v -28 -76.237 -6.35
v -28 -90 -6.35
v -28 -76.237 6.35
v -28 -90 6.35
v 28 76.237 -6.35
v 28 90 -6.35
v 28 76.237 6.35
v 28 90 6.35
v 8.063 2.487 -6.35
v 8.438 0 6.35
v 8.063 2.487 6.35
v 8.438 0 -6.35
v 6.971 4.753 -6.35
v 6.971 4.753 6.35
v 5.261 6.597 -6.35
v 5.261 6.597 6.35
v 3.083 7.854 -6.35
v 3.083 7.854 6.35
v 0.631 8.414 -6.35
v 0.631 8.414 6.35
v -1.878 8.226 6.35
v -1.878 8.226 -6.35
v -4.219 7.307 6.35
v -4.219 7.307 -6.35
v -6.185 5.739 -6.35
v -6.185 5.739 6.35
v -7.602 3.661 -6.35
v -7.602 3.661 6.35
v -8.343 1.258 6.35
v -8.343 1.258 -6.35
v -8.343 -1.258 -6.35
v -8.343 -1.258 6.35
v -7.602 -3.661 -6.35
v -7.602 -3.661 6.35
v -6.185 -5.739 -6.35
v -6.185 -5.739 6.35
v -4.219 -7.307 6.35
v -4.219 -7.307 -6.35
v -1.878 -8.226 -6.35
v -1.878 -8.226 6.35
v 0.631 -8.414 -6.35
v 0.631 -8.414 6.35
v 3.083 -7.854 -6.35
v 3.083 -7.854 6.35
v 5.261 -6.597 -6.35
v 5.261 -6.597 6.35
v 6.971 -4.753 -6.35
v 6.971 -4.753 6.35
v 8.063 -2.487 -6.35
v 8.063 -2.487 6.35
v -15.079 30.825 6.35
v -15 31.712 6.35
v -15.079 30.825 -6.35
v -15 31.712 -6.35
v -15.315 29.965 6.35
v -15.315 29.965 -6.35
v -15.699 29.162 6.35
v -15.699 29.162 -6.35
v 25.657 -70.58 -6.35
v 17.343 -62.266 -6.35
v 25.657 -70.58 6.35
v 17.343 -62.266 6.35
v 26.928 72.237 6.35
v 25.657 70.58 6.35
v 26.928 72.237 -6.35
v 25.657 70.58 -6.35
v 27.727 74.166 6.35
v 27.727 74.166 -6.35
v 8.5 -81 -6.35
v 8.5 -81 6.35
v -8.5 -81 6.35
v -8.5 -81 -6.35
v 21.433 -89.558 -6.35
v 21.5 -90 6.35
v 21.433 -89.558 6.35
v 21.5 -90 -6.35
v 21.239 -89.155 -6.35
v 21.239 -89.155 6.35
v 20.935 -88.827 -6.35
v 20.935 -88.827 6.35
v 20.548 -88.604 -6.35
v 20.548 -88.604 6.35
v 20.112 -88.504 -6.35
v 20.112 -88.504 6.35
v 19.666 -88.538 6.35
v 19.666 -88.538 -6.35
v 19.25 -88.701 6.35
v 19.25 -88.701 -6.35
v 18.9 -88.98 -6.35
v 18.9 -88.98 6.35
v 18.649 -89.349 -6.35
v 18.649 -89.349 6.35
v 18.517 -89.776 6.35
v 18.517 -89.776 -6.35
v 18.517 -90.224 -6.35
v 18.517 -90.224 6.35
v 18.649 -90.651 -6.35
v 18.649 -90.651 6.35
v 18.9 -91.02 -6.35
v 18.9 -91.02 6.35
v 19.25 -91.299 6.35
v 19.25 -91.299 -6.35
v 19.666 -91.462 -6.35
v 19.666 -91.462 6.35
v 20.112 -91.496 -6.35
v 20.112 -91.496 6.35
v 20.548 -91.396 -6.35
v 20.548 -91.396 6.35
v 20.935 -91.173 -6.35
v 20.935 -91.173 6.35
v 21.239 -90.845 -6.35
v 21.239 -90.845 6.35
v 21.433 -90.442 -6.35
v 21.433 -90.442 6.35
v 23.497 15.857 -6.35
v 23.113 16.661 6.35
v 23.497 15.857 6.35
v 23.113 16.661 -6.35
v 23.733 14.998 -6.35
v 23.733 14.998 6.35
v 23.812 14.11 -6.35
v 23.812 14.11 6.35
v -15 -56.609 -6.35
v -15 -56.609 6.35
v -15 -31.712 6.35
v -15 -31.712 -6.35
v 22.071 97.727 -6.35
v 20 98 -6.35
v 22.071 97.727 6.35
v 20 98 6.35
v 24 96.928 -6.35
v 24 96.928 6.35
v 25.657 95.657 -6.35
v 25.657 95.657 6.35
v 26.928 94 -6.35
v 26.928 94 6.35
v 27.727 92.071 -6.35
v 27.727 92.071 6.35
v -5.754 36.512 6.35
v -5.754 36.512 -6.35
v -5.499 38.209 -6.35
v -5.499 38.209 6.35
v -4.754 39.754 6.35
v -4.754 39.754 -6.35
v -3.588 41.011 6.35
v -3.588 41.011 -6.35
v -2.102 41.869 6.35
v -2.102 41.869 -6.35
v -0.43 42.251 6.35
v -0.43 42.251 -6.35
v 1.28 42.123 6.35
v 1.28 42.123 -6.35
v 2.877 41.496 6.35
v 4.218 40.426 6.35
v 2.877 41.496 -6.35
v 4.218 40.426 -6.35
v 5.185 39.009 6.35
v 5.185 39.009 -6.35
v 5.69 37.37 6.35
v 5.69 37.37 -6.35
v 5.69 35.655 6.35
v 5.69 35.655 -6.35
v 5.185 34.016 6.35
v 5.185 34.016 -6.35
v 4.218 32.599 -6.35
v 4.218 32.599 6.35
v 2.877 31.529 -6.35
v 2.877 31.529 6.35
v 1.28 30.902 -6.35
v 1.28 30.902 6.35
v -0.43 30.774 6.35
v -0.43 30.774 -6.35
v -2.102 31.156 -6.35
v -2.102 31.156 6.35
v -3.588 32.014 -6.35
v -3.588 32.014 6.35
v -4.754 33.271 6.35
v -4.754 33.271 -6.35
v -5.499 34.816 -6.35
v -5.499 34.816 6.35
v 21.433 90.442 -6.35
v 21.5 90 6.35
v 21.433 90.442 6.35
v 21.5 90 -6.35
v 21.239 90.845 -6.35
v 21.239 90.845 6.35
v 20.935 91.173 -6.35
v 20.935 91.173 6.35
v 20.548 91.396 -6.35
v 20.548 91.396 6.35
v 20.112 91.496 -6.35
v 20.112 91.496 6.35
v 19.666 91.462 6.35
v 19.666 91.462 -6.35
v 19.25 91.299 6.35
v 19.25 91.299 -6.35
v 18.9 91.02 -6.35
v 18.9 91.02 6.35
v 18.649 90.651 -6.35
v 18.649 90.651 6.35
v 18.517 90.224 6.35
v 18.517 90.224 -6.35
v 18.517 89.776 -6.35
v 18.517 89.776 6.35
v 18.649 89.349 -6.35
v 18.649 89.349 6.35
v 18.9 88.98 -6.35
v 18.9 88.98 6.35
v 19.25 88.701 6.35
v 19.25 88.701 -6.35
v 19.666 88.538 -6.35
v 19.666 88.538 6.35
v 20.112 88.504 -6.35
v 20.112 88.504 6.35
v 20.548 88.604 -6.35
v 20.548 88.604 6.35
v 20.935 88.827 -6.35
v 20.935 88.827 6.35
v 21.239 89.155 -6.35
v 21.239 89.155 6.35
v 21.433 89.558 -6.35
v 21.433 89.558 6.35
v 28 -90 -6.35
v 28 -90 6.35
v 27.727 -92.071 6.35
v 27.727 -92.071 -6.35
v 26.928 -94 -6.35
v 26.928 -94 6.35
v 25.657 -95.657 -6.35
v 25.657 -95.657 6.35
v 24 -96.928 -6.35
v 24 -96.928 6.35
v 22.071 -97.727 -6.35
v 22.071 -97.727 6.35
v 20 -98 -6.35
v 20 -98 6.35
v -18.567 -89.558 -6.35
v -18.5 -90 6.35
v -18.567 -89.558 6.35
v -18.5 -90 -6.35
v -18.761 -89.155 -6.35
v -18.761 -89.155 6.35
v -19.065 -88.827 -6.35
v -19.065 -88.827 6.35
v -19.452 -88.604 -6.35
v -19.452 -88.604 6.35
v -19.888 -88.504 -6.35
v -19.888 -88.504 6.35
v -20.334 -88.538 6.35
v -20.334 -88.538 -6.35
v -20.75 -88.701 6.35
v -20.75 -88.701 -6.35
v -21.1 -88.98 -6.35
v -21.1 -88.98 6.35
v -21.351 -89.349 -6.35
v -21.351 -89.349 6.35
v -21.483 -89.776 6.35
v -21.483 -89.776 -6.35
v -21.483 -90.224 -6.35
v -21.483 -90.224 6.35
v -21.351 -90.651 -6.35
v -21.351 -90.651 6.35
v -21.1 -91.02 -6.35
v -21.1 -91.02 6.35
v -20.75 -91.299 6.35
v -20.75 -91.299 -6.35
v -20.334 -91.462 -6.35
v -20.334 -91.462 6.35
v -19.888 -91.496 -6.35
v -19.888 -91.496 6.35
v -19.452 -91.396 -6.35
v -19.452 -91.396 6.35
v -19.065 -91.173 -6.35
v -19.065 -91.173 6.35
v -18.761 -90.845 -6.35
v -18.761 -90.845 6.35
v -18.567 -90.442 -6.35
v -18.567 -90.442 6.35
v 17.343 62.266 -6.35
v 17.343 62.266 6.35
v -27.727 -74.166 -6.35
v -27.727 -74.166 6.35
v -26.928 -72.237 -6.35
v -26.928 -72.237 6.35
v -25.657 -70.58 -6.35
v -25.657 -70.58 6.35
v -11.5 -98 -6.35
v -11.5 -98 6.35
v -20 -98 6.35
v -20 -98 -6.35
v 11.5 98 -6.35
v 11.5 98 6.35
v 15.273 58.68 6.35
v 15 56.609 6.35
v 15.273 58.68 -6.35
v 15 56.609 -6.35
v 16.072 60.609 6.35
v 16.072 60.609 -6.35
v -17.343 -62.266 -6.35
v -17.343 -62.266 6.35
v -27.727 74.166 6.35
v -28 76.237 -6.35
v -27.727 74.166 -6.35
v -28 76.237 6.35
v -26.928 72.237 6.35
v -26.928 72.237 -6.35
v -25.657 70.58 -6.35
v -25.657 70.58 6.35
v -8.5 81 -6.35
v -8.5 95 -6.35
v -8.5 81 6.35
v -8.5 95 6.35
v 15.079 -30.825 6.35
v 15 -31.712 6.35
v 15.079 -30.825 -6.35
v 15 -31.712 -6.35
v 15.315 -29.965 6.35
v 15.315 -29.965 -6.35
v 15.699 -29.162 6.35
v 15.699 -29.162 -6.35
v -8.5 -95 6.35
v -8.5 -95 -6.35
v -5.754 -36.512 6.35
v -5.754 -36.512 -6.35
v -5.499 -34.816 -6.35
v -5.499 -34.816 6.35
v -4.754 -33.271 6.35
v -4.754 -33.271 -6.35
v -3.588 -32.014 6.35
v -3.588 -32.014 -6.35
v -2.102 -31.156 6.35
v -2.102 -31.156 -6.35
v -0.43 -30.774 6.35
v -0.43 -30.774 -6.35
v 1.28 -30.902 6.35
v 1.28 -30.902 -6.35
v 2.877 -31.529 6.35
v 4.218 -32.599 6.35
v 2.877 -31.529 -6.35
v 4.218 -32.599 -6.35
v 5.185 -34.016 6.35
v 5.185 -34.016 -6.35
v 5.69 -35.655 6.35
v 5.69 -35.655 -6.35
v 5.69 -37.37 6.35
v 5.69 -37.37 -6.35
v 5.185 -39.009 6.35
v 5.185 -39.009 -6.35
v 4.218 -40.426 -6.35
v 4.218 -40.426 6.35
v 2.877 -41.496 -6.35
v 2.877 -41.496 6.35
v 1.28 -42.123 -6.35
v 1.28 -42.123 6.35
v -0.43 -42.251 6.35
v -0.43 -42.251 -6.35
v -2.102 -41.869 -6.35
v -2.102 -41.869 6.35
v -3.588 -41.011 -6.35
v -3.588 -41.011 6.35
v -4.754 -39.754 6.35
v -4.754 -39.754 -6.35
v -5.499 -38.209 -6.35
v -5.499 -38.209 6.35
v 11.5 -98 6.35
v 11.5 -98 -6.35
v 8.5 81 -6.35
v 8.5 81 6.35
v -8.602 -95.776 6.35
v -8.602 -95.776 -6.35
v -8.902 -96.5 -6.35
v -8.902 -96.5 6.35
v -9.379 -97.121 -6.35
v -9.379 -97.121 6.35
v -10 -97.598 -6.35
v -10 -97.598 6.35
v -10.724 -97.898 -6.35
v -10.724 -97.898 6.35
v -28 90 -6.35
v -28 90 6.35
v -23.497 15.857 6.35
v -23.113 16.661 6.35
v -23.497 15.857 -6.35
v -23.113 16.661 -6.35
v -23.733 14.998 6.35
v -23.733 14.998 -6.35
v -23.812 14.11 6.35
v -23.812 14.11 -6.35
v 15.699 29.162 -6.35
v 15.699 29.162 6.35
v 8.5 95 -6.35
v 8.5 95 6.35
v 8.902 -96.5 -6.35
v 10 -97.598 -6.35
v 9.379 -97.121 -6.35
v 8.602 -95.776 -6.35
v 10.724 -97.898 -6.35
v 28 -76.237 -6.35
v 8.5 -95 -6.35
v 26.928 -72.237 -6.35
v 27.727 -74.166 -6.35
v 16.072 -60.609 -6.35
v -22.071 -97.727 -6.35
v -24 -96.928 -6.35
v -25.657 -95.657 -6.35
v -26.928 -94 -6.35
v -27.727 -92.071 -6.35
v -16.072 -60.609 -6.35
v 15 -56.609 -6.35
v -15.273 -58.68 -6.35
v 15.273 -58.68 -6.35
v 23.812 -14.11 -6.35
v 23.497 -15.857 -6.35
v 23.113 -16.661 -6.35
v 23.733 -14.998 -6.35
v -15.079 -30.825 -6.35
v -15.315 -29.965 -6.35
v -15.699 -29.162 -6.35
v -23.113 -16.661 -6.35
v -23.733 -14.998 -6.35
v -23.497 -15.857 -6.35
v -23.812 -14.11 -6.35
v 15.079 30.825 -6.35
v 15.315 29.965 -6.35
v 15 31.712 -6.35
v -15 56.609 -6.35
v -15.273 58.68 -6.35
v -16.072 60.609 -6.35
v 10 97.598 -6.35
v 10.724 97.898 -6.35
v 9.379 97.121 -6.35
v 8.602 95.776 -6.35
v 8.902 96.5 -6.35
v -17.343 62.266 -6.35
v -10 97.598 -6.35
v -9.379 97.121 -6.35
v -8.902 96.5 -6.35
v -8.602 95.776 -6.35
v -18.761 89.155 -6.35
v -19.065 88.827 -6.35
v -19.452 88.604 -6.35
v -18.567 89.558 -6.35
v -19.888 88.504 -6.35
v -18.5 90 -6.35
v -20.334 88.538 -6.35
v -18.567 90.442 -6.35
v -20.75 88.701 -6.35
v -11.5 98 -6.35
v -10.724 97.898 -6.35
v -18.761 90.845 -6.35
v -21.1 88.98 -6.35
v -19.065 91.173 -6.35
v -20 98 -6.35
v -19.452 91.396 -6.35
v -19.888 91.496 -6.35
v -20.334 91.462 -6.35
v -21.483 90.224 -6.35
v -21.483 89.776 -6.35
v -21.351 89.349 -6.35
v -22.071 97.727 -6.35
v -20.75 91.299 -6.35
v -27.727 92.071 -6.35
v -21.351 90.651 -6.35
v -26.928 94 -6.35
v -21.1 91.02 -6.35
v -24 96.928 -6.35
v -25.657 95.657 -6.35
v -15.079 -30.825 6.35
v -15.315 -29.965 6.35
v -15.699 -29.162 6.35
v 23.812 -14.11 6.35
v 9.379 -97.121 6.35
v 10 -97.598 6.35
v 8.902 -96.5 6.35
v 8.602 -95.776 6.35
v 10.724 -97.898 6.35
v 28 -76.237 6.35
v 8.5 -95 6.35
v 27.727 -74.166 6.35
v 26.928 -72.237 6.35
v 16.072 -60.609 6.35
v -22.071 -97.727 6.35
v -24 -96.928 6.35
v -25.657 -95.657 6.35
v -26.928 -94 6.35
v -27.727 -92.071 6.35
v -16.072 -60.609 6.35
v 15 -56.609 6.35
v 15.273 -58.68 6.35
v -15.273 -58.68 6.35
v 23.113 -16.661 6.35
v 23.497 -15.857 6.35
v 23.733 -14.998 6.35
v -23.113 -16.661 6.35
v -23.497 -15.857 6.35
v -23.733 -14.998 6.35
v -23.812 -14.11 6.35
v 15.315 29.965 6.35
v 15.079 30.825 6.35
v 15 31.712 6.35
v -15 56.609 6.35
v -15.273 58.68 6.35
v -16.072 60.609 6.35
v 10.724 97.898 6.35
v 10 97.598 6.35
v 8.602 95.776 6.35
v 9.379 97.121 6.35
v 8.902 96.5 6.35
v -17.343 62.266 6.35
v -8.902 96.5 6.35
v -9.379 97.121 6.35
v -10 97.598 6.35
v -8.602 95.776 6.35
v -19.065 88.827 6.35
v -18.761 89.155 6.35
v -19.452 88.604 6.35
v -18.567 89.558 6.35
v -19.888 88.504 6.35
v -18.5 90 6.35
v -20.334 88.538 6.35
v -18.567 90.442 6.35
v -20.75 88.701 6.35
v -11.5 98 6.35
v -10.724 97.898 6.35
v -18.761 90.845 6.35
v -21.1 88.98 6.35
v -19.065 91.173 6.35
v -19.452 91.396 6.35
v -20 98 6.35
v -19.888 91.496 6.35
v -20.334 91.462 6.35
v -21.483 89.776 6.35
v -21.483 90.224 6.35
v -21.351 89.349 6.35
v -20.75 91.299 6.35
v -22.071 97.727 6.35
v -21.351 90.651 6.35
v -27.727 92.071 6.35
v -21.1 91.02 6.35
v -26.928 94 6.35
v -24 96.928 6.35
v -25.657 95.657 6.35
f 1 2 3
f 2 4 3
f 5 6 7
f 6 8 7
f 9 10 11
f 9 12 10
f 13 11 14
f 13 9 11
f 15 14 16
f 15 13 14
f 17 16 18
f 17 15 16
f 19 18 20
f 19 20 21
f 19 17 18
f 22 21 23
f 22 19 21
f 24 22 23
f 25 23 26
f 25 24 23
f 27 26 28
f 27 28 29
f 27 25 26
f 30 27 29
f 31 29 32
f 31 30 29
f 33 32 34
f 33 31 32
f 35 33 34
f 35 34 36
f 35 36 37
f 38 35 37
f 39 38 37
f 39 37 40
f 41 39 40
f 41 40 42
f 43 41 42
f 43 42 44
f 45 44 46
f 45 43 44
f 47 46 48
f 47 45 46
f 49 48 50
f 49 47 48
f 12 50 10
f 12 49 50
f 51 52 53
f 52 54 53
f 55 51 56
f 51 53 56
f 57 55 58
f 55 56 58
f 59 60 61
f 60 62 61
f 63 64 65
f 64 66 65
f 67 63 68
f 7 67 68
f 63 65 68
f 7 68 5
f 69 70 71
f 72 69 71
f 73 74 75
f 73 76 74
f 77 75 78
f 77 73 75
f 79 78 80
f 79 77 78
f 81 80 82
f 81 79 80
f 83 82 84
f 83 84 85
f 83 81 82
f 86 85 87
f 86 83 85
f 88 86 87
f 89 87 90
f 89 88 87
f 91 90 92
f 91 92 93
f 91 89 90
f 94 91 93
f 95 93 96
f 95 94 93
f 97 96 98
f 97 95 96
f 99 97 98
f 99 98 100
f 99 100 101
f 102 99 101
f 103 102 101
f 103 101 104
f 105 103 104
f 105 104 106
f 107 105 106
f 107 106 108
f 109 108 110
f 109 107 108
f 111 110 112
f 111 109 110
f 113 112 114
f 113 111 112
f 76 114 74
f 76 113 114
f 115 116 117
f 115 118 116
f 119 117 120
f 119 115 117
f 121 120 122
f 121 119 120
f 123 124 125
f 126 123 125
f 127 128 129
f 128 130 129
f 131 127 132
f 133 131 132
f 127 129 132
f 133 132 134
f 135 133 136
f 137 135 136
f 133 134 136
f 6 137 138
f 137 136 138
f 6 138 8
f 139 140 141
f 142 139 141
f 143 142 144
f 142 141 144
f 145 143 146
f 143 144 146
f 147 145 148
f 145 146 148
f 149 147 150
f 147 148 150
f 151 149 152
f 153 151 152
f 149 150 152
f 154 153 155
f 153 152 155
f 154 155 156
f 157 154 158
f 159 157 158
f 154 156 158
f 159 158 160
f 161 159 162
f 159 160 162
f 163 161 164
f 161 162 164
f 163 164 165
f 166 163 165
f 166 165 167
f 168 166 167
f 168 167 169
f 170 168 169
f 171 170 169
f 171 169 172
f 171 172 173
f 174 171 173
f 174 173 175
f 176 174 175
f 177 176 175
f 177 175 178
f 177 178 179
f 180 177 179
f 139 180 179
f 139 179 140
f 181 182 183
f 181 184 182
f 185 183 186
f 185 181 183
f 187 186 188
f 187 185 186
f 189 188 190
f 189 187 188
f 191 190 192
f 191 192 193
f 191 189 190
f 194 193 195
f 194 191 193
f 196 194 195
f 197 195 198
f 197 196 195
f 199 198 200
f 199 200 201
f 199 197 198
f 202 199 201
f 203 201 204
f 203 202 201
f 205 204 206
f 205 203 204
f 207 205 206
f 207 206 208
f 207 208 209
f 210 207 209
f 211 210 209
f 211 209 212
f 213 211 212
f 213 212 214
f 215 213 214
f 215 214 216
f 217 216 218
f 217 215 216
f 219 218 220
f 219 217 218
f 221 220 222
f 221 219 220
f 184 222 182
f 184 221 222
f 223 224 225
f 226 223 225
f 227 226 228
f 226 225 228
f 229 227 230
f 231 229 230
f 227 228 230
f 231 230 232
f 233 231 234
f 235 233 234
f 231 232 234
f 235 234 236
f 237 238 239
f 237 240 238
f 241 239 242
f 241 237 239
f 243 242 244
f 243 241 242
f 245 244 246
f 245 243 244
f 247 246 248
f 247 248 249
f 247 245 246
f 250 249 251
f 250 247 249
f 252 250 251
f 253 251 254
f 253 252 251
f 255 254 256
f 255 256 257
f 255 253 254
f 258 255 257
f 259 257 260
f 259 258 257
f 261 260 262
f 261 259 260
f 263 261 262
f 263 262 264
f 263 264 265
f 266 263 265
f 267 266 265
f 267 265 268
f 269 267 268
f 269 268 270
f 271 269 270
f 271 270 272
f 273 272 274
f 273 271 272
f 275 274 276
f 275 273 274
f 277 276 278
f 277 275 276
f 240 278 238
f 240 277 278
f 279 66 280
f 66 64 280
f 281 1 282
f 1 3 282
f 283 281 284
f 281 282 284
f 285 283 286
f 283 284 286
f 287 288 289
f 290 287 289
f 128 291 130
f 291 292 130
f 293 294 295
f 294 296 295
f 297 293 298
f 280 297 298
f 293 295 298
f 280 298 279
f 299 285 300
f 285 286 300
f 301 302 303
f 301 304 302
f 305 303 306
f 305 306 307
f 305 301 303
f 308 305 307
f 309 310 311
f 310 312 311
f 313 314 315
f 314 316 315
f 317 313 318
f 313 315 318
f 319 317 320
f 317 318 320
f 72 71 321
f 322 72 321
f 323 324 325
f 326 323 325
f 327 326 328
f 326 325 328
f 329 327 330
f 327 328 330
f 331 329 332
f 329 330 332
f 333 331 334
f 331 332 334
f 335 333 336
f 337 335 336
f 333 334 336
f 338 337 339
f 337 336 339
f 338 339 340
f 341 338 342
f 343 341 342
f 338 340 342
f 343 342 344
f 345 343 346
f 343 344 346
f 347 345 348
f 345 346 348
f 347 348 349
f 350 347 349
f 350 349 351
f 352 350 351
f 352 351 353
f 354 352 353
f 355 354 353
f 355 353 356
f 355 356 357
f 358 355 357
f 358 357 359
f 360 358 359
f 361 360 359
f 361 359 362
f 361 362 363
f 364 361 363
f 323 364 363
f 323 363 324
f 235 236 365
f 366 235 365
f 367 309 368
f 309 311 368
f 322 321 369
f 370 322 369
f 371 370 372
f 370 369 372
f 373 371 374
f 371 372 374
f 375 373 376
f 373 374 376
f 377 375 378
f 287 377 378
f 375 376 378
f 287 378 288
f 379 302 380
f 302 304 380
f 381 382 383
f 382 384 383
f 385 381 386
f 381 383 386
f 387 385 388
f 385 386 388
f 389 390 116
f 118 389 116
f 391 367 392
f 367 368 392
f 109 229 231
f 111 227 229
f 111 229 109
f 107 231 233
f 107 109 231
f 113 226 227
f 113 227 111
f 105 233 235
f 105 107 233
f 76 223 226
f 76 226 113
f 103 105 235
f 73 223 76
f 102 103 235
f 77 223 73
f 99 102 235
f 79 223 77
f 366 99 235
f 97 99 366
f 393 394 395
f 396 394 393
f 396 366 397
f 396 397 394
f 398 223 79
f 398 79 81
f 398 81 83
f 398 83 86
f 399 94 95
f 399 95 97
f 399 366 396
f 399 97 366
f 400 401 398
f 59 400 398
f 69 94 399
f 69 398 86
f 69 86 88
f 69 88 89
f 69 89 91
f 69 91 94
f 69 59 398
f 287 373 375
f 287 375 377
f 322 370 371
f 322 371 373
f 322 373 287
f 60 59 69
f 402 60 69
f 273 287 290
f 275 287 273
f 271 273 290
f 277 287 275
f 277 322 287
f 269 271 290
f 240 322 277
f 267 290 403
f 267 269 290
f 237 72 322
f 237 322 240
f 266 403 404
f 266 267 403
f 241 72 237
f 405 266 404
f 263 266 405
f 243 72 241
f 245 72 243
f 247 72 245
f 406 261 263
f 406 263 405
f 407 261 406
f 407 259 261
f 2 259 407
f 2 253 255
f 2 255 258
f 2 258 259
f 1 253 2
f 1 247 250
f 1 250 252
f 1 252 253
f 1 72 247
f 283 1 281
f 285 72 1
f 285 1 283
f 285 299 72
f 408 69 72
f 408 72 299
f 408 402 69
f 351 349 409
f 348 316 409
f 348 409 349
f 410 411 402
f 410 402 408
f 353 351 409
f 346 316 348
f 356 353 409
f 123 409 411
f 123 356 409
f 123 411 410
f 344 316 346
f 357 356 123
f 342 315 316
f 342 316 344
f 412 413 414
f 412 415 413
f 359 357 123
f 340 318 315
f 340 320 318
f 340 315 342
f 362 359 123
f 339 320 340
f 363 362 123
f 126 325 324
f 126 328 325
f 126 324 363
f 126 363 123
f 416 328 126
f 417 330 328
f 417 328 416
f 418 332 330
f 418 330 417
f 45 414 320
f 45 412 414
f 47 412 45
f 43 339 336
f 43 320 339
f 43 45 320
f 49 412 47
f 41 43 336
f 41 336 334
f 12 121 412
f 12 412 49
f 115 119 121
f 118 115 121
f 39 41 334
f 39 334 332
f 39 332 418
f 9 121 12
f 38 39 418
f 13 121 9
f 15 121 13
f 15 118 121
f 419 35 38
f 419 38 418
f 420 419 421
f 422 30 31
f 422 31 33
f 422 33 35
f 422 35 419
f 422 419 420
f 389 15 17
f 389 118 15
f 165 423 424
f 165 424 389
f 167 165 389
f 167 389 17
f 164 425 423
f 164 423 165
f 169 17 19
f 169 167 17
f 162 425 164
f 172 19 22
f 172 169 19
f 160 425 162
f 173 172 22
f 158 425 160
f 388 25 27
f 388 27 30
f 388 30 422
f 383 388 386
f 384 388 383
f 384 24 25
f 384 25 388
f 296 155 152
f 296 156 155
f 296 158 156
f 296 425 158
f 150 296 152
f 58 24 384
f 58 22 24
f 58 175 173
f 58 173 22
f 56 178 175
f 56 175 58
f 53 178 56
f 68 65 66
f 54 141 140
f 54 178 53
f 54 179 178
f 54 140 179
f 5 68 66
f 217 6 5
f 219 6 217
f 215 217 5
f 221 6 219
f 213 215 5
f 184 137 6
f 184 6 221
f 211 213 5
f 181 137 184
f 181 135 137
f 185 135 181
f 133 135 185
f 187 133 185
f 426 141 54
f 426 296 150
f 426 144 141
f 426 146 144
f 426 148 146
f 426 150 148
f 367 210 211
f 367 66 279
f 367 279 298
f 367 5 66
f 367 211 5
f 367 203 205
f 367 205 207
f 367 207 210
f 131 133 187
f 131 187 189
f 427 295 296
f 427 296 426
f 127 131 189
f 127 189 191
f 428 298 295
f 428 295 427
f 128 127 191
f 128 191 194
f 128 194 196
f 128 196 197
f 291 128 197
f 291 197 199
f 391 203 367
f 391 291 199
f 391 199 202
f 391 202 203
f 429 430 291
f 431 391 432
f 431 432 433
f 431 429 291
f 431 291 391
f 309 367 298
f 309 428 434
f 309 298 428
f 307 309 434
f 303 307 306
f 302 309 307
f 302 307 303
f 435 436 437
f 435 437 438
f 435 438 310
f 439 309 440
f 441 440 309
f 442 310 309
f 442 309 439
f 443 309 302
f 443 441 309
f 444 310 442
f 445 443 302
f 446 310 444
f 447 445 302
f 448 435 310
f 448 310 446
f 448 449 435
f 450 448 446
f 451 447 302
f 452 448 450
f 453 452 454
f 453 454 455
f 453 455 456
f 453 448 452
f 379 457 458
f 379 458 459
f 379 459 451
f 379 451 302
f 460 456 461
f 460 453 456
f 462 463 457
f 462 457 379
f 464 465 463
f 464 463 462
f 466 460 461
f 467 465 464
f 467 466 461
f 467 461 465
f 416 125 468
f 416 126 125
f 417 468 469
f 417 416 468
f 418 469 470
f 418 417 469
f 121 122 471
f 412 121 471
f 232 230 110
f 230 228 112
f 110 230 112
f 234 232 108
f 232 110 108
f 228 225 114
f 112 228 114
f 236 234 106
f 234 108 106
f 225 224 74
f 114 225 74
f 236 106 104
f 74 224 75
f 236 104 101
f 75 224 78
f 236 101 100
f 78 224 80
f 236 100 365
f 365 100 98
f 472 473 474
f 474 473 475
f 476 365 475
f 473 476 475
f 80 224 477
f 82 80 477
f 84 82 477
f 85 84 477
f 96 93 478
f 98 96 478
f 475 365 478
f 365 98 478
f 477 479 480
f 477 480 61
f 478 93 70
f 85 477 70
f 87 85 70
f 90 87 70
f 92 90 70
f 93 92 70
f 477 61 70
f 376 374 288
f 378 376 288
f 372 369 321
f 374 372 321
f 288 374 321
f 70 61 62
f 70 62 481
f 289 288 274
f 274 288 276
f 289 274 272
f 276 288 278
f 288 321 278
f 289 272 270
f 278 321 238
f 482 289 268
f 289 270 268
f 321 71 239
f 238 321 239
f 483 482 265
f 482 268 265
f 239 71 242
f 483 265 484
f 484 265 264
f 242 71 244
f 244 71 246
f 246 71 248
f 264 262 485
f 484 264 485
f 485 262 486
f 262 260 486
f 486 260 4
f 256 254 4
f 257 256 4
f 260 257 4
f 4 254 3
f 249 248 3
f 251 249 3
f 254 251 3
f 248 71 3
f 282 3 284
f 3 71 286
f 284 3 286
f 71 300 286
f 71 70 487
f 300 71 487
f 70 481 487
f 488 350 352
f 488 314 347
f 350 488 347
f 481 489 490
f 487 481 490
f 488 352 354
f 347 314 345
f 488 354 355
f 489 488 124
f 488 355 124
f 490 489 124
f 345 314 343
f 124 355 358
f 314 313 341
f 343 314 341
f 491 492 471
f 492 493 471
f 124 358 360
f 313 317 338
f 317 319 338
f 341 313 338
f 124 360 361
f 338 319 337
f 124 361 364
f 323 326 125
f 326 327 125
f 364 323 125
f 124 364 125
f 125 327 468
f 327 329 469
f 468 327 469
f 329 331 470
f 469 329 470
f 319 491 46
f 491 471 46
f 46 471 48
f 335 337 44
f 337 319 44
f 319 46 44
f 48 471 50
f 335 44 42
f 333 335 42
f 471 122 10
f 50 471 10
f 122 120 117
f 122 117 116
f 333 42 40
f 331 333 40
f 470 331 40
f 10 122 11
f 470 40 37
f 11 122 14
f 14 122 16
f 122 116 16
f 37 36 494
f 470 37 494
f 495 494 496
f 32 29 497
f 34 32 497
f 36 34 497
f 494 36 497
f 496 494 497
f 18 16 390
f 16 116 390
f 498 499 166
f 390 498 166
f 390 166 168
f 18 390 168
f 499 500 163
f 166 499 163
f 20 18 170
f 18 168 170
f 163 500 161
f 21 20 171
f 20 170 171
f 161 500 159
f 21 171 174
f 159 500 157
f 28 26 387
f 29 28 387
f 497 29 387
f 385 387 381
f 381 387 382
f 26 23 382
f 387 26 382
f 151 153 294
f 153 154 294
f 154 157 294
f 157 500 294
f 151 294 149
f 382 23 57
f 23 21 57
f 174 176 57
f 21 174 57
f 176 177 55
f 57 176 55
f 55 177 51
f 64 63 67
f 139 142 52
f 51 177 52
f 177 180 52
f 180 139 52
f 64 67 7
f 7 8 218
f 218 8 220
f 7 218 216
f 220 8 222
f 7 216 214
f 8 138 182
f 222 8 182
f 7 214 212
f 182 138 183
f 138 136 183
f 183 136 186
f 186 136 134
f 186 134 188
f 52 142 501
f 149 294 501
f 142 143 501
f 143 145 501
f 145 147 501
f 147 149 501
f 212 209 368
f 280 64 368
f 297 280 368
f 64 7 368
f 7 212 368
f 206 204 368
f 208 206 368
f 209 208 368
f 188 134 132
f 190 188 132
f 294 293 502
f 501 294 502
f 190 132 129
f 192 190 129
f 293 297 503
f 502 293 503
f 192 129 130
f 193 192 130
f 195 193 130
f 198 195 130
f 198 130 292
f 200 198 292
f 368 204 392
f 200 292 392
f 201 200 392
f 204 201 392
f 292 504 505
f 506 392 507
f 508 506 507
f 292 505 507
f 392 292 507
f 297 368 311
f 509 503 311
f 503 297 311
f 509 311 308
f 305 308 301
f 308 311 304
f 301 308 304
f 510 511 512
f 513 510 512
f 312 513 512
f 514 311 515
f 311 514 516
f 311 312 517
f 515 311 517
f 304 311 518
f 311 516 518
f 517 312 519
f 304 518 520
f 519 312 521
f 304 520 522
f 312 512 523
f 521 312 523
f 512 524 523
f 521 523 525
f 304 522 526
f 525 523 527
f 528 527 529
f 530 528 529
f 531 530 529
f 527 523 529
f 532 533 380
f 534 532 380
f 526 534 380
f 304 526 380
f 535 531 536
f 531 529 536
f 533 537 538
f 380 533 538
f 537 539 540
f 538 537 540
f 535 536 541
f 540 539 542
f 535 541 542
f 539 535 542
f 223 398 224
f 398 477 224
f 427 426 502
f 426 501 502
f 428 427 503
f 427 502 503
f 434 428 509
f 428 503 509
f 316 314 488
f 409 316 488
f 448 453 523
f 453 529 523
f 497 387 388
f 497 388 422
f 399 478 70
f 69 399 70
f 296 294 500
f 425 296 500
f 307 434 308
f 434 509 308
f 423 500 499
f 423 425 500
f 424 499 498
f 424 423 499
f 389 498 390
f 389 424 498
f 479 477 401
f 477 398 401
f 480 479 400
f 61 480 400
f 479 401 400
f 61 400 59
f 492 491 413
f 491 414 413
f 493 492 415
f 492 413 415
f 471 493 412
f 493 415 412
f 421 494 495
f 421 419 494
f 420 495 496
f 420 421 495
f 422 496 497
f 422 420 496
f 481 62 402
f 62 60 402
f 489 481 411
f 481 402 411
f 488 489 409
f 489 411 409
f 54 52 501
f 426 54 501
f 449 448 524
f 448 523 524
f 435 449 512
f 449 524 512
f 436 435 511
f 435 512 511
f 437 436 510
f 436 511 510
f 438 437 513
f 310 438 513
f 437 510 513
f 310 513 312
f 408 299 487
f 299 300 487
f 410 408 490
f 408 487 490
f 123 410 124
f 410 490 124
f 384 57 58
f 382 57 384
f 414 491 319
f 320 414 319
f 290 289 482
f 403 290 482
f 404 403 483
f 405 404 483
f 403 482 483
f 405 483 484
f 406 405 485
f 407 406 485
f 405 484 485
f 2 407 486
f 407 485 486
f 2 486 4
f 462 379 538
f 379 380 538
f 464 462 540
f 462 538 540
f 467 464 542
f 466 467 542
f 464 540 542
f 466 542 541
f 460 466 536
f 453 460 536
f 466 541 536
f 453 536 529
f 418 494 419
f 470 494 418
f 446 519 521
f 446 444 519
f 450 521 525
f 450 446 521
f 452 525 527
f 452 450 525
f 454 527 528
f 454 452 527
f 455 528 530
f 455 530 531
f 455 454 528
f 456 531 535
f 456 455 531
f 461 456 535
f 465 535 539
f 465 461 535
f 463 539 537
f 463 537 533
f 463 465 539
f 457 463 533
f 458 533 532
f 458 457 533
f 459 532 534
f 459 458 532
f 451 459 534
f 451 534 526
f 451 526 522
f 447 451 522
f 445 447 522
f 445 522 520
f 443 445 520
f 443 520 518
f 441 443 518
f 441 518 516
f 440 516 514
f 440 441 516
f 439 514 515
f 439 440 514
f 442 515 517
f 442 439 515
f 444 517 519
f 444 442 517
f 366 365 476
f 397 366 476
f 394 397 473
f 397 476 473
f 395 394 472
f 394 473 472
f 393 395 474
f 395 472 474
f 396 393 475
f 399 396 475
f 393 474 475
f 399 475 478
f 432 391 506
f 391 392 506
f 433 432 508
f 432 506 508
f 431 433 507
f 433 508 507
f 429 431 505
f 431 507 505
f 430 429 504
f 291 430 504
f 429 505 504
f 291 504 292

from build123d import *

# Parameters (mm, degrees)
SKETCH1_R                = 8.4375
SKETCH1_R_2              = 1.5
BOSS_EXTRUDE1_DEPTH      = 6.35
FILLET1_R                = 8
F_7_16_CLEARANCE_HOLE4_D = 11.50874
BOSS_EXTRUDE2_DEPTH      = 12.7
FILLET2_R                = 5


with BuildPart() as part:
    # Sketch1 → Boss-Extrude1 (new body, symmetric)
    with BuildSketch(Plane.XY):
        with BuildLine():
            Line((-28, 72.922835534), (-28, 90))
            ThreePointArc((-28, 90), (-25.656854249, 95.656854249), (-20, 98))
            Line((-20, 98), (-11.5, 98))
            ThreePointArc((-11.5, 98), (-9.378679656, 97.121320344), (-8.5, 95))
            Line((-8.5, 95), (-8.5, 81))
            Line((-8.5, 81), (8.5, 81))
            Line((8.5, 81), (8.5, 95))
            ThreePointArc((8.5, 95), (9.378679656, 97.121320344), (11.5, 98))
            Line((11.5, 98), (20, 98))
            ThreePointArc((20, 98), (25.656854249, 95.656854249), (28, 90))
            Line((28, 90), (28, 72.922835534))
            Line((28, 72.922835534), (15, 59.922835534))
            Line((15, 59.922835534), (15, -59.922835534))
            Line((15, -59.922835534), (28, -72.922835534))
            Line((28, -72.922835534), (28, -90))
            ThreePointArc((28, -90), (25.656854249, -95.656854249), (20, -98))
            Line((20, -98), (11.5, -98))
            ThreePointArc((11.5, -98), (9.378679656, -97.121320344), (8.5, -95))
            Line((8.5, -95), (8.5, -81))
            Line((8.5, -81), (-8.5, -81))
            Line((-8.5, -81), (-8.5, -95))
            ThreePointArc((-8.5, -95), (-9.378679656, -97.121320344), (-11.5, -98))
            Line((-11.5, -98), (-20, -98))
            ThreePointArc((-20, -98), (-25.656854249, -95.656854249), (-28, -90))
            Line((-28, -90), (-28, -72.922835534))
            Line((-28, -72.922835534), (-15, -59.922835534))
            Line((-15, -59.922835534), (-15, 59.922835534))
            Line((-15, 59.922835534), (-28, 72.922835534))
        make_face()
        Circle(SKETCH1_R, mode=Mode.SUBTRACT)
        with Locations((-20, 90)):
            Circle(SKETCH1_R_2, mode=Mode.SUBTRACT)
        with Locations((20, 90)):
            Circle(SKETCH1_R_2, mode=Mode.SUBTRACT)
        with Locations((20, -90)):
            Circle(SKETCH1_R_2, mode=Mode.SUBTRACT)
        with Locations((-20, -90)):
            Circle(SKETCH1_R_2, mode=Mode.SUBTRACT)
    extrude(amount=BOSS_EXTRUDE1_DEPTH, both=True)

    # Fillet1
    fillet1_edges = [part.edges().sort_by_distance(p)[0] for p in [
        (-28, 72.922835534, 0),
        (28, 72.922835534, 0),
        (15, 59.922835534, 0),
        (15, -59.922835534, 0),
        (28, -72.922835534, 0),
        (-28, -72.922835534, 0),
        (-15, -59.922835534, 0),
        (-15, 59.922835534, 0),
    ]]
    fillet(fillet1_edges, radius=FILLET1_R)

    # 7/16 Clearance Hole4 (through all)
    with Locations(Plane.XY.offset(6.35)):
        with Locations((0, 36.5125), (0, -36.5125)):
            Hole(F_7_16_CLEARANCE_HOLE4_D / 2)

    # Sketch6 → Boss-Extrude2 (add)
    with BuildSketch(Plane.XY.offset(6.35)):
        Polygon((-15, 30.340959615), (-23.8125, 15.4813), (-23.8125, -15.4813), (-15, -30.340959615), align=None)
        Polygon((23.8125, -15.4813), (15, -30.340959615), (15, 30.340959615), (23.8125, 15.4813), align=None)
    extrude(amount=-BOSS_EXTRUDE2_DEPTH)

    # Fillet2
    fillet2_edges = [part.edges().sort_by_distance(p)[0] for p in [
        (-23.8125, 15.4813, 0),
        (-23.8125, -15.4813, 0),
        (-15, -30.340959615, 0),
        (-15, 30.340959615, 0),
        (15, 30.340959615, 0),
        (15, -30.340959615, 0),
        (23.8125, -15.4813, 0),
        (23.8125, 15.4813, 0),
    ]]
    fillet(fillet2_edges, radius=FILLET2_R)


solid = part.part
